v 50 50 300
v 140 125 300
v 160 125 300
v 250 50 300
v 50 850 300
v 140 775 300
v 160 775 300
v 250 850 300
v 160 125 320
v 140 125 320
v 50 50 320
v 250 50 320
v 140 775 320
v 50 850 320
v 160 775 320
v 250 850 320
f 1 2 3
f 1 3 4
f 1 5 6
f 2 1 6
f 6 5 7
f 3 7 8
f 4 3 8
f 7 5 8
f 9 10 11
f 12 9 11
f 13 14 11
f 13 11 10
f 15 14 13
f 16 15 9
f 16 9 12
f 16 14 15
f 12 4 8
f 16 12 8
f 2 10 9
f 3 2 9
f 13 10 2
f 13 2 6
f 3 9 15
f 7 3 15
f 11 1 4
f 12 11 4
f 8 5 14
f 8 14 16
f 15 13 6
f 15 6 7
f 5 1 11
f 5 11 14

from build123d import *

# Parameters (mm, degrees)
RECTANGLE027_W   = 20
RECTANGLE027_H   = 650
EXTRUDE063_DEPTH = 20
RECTANGLE026_W   = 200
RECTANGLE026_H   = 800
EXTRUDE062_DEPTH = 20


with BuildPart() as extrude063:
    # Rectangle027 → Extrude063 (new body)
    with BuildSketch(Plane(origin=(289.620605, 275.315636, 420), x_dir=(1, 0, 0), z_dir=(0, 0, 1))):
        with Locations((10, 325)):
            Rectangle(RECTANGLE027_W, RECTANGLE027_H)
    extrude(amount=-EXTRUDE063_DEPTH)


with BuildPart() as extrude063_1:
    # Extrude063 placement: moved
    add(extrude063.part.moved(Location((-149.620605, -150.315636, -100))))


with BuildPart() as cut015:
    # Rectangle026 → Extrude062 (new body)
    with BuildSketch(Plane(origin=(207.600586, 206.495789, 400), x_dir=(1, 0, 0), z_dir=(0, 0, 1))):
        with Locations((100, 400)):
            Rectangle(RECTANGLE026_W, RECTANGLE026_H)
    extrude(amount=EXTRUDE062_DEPTH)


with BuildPart() as cut015_1:
    # Extrude062 placement: moved
    add(cut015.part.moved(Location((-157.600586, -156.495789, -100))))

    # Cut015: cut Extrude063
    add(extrude063_1.part, mode=Mode.SUBTRACT)


solid = cut015_1.part
